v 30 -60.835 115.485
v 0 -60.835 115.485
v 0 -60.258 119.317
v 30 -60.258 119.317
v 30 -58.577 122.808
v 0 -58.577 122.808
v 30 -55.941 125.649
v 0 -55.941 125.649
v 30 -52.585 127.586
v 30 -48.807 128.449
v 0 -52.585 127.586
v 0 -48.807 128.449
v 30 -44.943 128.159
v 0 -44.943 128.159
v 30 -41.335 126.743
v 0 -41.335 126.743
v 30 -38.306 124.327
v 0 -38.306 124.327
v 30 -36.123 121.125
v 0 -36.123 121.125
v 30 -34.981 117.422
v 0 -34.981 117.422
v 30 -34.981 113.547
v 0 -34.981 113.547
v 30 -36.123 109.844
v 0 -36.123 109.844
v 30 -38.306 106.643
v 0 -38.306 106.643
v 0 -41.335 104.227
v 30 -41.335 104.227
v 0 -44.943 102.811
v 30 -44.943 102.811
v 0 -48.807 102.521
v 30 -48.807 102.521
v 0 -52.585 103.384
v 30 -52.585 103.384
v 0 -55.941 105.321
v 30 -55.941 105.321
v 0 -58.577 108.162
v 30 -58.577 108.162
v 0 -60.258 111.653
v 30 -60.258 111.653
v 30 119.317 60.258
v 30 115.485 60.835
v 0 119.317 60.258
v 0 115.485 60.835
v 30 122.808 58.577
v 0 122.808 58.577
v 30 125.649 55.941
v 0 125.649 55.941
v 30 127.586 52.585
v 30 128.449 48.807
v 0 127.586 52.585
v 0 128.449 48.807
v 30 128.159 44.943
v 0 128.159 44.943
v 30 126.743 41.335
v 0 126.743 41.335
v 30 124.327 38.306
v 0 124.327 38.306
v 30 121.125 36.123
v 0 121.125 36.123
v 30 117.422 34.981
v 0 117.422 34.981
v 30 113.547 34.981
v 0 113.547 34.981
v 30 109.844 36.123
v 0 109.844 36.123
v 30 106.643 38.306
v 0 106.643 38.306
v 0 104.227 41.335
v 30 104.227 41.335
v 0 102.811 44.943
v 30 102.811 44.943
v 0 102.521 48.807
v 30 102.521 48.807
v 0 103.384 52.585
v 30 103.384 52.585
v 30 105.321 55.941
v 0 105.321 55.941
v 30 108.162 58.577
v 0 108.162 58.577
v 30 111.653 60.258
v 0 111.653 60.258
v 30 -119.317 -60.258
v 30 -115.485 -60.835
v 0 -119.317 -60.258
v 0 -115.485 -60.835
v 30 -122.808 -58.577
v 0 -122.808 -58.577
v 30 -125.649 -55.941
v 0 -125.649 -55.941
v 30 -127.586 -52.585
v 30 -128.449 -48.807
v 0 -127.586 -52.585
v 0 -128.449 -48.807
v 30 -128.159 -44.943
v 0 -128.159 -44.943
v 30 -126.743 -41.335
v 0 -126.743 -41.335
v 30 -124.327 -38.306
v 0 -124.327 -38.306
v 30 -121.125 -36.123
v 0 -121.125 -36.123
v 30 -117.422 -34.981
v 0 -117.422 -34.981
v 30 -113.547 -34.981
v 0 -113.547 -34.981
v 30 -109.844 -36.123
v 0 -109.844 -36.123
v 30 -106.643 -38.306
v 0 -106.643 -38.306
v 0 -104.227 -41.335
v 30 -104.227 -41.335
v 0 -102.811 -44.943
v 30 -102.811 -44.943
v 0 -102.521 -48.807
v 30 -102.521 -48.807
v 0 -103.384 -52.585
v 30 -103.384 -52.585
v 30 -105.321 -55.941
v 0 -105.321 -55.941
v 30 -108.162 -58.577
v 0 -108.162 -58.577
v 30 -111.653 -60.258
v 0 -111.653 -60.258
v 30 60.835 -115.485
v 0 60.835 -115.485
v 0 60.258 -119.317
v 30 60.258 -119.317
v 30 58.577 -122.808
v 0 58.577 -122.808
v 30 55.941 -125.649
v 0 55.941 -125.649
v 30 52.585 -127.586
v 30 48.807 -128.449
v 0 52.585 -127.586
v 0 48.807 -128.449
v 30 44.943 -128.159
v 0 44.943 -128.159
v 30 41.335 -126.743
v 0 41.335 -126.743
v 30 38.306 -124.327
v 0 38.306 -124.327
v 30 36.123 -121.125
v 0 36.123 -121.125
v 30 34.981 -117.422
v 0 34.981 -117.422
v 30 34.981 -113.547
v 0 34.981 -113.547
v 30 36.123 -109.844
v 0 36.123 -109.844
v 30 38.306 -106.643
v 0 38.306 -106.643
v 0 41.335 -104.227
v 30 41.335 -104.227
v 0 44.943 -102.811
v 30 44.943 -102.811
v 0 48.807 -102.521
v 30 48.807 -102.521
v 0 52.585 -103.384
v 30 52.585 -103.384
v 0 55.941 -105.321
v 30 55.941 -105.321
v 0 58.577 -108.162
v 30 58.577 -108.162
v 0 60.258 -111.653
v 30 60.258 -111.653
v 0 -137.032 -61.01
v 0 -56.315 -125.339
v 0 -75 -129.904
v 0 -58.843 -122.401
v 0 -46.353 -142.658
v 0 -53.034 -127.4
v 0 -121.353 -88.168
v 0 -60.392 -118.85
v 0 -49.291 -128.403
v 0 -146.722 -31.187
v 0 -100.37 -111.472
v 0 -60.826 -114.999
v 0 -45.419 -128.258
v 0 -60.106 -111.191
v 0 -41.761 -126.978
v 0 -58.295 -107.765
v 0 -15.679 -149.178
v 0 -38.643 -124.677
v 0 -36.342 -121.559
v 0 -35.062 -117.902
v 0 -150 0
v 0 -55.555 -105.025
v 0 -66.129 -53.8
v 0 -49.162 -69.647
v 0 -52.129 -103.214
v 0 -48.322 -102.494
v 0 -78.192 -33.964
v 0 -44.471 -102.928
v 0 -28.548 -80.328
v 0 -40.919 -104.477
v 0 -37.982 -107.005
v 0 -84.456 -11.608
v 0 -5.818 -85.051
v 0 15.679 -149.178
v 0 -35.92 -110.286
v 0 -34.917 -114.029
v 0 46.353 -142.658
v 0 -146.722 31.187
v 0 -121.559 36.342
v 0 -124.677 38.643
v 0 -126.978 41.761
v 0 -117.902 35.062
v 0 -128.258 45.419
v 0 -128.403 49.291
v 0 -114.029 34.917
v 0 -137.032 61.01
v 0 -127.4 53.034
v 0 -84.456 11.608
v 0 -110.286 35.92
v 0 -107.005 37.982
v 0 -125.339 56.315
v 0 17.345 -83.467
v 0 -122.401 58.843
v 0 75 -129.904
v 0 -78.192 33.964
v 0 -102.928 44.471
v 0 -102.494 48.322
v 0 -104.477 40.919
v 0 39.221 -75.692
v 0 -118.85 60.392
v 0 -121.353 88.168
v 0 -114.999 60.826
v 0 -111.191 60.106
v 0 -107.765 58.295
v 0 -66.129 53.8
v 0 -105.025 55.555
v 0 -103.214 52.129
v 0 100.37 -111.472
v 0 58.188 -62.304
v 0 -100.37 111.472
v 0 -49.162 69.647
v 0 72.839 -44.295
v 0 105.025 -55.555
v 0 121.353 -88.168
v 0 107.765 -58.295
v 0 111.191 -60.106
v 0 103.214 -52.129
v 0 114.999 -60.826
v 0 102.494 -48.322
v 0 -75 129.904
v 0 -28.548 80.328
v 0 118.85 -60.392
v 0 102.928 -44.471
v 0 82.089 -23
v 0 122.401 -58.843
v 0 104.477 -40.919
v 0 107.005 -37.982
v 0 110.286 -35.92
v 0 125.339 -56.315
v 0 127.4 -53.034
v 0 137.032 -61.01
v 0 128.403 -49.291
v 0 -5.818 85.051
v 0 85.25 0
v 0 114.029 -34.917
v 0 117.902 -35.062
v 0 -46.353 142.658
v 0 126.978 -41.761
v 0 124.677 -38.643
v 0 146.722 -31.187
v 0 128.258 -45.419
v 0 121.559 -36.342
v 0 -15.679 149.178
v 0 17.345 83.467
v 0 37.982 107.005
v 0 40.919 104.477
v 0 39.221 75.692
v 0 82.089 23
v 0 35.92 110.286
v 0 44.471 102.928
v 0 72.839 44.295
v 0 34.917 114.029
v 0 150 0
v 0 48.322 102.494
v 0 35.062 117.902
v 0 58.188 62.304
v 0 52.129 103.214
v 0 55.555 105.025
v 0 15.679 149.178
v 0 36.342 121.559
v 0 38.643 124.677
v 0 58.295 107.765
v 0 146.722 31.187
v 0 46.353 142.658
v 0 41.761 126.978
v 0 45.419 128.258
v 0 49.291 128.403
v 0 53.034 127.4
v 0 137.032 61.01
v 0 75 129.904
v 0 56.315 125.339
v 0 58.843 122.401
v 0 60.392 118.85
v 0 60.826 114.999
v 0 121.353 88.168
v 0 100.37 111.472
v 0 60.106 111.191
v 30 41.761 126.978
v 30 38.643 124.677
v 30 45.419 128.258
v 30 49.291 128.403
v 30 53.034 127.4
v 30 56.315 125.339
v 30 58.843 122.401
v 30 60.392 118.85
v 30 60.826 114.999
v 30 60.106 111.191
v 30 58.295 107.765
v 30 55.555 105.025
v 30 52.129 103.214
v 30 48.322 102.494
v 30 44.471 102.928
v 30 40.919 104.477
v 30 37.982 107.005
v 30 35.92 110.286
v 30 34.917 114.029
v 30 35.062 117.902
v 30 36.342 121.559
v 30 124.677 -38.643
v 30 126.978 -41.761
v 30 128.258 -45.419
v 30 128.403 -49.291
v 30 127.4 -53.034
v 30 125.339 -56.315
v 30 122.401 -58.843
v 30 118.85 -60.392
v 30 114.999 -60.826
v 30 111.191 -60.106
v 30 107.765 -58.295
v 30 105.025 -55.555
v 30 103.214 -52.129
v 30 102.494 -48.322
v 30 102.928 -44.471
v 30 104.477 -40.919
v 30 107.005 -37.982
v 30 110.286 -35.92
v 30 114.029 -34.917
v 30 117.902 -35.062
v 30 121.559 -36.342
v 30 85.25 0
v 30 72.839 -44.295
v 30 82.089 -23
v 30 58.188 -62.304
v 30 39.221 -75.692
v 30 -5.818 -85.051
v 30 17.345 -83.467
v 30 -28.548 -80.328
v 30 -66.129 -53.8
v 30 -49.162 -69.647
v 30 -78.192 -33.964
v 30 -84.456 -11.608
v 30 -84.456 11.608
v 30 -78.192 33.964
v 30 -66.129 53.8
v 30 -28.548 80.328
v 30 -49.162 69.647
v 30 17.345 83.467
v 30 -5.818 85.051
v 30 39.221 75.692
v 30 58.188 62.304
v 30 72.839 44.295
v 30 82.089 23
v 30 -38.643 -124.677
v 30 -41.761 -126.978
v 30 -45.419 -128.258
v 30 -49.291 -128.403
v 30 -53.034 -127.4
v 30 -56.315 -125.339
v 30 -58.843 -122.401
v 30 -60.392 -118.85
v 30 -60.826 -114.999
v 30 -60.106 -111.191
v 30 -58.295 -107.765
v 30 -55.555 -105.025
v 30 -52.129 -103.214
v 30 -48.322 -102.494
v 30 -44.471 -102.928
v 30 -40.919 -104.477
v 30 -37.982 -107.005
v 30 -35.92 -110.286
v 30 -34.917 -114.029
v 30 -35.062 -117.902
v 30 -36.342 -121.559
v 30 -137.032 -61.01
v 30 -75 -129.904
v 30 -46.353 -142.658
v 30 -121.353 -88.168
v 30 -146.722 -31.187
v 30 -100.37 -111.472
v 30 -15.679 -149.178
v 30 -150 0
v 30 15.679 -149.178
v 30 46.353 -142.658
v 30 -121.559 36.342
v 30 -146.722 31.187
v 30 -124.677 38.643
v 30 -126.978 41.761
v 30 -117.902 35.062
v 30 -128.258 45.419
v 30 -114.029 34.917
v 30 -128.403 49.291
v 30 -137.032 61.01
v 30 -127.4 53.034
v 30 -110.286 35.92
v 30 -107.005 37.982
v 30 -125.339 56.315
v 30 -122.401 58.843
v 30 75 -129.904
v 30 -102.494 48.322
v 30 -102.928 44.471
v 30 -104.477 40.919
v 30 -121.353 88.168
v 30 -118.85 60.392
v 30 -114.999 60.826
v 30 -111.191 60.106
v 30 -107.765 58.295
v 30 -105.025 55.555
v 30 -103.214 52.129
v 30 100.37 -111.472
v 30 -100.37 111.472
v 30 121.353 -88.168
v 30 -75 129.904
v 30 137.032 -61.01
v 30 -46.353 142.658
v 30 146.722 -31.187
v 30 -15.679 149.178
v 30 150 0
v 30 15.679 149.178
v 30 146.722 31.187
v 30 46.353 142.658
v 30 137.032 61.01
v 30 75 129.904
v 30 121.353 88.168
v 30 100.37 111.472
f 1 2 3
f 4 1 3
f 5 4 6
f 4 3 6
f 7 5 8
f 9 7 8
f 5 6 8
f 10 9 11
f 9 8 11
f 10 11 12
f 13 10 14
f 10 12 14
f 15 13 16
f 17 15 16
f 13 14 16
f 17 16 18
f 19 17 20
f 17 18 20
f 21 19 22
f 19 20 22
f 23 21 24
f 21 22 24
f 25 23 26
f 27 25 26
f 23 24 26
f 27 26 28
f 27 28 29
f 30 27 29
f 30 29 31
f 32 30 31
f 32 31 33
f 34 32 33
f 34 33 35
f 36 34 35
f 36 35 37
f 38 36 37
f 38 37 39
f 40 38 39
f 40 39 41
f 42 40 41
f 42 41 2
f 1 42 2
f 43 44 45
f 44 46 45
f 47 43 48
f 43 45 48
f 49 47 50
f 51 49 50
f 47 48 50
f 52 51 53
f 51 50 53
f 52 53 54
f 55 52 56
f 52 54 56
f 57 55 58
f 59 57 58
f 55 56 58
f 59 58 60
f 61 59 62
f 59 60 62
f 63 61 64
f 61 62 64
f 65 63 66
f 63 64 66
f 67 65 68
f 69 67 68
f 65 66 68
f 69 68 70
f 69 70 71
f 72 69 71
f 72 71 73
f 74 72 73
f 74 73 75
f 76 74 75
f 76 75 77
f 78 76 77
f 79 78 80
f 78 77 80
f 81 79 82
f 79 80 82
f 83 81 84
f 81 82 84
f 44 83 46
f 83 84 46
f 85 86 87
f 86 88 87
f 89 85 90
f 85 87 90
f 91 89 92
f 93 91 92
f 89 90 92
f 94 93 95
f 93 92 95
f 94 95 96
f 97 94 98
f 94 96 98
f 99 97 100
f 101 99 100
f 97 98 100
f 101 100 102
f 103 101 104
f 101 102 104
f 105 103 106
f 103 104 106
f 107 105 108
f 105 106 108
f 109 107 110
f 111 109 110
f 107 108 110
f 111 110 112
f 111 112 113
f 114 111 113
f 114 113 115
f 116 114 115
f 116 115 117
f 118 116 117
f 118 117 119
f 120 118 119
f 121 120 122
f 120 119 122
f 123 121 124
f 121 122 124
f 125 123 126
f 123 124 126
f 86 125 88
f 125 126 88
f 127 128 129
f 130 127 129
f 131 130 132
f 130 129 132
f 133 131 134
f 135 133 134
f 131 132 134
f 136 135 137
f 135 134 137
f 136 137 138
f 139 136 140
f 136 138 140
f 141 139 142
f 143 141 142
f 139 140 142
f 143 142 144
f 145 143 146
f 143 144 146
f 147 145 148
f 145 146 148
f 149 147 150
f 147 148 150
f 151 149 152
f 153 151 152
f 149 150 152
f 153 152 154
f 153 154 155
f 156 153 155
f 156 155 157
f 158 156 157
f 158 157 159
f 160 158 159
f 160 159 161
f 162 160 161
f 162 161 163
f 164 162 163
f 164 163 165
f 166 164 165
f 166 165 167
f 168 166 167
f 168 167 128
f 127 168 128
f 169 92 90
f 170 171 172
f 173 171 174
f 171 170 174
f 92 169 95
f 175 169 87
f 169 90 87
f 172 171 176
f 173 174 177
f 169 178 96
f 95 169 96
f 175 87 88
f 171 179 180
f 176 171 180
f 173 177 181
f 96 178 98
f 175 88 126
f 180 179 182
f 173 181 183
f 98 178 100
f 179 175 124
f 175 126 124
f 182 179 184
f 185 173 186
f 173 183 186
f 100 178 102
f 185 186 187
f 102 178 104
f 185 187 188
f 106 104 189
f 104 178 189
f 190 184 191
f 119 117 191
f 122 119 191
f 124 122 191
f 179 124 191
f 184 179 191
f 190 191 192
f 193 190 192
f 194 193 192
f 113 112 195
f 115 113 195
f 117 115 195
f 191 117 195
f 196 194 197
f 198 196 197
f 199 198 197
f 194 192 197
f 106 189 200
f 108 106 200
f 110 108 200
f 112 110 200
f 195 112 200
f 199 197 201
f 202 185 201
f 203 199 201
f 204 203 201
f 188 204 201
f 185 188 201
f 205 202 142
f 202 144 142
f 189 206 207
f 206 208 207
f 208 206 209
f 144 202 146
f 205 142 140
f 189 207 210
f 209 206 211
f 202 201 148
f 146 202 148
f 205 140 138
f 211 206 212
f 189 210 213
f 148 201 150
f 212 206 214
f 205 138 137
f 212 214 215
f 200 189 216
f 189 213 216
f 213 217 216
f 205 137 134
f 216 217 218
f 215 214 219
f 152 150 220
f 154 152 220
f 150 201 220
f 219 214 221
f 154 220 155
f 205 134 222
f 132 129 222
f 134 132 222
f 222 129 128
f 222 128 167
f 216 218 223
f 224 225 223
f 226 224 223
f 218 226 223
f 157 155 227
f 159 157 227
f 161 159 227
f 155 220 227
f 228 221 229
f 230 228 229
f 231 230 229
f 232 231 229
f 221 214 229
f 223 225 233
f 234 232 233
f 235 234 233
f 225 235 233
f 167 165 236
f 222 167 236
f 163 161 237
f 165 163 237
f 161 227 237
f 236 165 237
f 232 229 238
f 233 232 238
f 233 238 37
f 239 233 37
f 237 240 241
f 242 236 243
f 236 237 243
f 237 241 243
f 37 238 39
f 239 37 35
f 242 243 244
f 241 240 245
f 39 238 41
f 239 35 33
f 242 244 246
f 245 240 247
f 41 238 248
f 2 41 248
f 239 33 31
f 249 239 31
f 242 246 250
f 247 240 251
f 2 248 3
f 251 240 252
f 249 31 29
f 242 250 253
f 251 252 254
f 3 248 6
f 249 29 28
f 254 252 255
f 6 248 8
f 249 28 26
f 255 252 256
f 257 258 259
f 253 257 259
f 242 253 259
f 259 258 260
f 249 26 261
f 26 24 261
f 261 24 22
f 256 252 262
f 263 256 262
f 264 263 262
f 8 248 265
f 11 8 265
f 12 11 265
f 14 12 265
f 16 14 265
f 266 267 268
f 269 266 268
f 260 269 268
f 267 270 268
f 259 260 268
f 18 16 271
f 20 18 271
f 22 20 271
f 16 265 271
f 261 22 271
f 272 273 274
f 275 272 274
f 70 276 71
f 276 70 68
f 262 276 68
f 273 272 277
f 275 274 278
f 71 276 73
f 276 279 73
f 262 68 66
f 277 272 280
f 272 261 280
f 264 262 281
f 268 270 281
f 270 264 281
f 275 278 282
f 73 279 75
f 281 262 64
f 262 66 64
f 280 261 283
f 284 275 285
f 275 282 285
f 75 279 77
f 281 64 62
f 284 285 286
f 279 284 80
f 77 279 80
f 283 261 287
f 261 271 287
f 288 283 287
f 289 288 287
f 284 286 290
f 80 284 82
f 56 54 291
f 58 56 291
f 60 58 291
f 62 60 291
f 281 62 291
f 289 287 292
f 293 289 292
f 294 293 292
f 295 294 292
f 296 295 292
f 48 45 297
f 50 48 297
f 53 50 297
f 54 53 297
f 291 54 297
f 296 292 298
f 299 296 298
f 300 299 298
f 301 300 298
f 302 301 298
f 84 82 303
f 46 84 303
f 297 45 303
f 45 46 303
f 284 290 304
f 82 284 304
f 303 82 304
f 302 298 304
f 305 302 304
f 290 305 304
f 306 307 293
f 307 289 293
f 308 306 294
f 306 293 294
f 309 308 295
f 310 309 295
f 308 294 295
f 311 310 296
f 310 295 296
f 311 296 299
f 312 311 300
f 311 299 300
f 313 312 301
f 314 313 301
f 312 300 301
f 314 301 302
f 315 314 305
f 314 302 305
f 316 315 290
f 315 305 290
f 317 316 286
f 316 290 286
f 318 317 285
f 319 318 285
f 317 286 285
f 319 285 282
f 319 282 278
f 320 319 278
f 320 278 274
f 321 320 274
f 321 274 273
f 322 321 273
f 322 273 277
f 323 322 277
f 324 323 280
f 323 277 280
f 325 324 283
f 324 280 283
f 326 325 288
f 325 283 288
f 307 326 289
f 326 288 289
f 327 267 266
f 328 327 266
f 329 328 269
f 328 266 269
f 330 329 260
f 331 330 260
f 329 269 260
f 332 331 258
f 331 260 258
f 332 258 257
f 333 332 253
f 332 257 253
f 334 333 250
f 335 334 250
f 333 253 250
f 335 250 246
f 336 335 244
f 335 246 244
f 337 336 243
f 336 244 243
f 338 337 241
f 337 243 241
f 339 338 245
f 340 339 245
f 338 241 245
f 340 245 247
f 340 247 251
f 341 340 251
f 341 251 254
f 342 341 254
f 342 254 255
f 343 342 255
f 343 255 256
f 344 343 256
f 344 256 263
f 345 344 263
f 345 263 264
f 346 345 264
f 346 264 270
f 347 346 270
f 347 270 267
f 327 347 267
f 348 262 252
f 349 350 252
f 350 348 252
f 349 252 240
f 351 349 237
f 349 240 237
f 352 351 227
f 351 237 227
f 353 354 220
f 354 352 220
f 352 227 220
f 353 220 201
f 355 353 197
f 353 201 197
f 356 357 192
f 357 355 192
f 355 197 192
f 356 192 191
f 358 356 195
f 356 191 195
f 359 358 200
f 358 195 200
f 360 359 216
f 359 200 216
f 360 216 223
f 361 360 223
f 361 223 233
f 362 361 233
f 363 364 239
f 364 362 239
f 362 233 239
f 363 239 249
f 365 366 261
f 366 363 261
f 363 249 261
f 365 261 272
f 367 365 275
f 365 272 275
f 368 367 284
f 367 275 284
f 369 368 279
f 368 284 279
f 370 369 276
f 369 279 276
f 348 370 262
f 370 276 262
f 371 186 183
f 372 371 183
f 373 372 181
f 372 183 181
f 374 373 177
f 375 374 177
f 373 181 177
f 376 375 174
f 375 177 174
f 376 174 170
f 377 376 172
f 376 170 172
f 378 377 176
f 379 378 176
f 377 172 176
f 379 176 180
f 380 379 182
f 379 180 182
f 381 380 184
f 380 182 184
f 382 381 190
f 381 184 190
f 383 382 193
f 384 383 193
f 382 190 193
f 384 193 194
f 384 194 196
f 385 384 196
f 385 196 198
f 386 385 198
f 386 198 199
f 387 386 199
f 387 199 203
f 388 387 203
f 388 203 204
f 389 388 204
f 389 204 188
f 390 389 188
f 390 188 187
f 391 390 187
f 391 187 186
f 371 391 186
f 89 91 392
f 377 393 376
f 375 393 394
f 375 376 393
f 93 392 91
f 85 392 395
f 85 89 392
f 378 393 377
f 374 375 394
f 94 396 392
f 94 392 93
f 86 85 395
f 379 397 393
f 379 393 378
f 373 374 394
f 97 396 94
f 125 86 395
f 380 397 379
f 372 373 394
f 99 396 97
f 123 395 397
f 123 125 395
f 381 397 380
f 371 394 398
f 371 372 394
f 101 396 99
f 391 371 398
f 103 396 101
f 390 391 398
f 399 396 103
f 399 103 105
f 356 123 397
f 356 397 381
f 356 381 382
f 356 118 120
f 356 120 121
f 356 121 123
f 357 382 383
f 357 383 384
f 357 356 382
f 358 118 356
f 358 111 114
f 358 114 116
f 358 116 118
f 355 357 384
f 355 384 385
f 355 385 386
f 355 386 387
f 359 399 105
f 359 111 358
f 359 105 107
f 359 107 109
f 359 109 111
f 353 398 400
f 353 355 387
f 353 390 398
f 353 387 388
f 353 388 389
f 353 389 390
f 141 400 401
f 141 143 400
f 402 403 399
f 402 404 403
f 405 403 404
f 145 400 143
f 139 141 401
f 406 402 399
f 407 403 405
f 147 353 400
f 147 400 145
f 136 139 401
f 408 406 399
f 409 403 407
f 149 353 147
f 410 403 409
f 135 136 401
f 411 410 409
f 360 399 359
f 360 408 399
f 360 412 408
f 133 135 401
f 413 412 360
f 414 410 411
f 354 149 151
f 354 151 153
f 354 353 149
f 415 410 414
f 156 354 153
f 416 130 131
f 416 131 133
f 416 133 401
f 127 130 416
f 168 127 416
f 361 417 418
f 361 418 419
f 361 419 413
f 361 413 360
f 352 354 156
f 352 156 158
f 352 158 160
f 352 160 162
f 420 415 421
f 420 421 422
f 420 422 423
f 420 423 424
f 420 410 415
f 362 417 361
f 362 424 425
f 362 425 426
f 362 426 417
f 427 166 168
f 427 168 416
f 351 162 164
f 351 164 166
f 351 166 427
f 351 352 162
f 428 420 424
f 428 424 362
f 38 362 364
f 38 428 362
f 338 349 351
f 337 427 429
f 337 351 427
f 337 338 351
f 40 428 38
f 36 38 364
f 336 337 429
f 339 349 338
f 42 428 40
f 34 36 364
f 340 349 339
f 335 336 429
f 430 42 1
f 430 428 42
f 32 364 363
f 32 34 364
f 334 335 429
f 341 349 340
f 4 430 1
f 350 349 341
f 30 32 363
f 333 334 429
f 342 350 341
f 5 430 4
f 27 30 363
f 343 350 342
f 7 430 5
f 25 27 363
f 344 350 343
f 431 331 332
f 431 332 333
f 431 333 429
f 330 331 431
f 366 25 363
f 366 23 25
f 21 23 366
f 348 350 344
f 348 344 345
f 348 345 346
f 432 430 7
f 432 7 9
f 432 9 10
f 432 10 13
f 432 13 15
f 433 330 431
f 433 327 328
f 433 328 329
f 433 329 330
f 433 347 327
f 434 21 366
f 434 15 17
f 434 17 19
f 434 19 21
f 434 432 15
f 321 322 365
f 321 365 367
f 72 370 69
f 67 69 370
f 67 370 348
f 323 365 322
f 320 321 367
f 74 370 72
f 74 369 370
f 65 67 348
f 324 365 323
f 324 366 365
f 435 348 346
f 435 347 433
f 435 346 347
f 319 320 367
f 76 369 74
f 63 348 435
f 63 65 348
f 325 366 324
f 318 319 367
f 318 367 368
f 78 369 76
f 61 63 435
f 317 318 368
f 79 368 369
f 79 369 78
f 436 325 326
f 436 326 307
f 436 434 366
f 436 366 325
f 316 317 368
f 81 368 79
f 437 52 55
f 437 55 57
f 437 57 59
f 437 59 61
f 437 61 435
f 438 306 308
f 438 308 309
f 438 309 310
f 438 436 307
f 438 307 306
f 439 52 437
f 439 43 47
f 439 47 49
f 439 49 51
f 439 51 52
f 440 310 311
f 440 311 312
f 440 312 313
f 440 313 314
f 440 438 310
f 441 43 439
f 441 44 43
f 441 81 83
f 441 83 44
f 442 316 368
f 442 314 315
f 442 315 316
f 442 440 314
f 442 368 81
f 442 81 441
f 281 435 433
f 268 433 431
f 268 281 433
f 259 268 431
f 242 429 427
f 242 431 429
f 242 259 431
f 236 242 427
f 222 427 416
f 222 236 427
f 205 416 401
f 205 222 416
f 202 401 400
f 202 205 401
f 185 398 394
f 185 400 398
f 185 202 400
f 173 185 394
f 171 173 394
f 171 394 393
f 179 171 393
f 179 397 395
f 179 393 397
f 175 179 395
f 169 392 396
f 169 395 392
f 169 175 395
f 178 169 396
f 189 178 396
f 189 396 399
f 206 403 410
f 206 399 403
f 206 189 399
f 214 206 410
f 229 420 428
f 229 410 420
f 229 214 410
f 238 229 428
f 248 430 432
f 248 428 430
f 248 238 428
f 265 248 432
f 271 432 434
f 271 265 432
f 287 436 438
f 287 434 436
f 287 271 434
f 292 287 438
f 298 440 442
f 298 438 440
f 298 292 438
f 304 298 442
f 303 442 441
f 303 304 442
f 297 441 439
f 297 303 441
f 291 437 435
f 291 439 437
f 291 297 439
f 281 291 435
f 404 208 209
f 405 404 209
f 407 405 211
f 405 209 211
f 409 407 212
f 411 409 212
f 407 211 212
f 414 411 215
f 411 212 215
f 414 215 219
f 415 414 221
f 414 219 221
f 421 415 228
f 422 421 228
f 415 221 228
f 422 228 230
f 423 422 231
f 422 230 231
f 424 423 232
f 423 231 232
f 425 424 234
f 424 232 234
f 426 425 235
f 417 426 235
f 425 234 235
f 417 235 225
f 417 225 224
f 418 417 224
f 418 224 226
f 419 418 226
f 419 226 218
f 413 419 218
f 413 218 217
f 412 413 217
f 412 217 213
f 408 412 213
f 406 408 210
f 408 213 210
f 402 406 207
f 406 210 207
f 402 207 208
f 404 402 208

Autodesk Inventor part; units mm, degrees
ref_plane "YZ Plane" through (0, 0, 0) normal (1, 0, 0) x (0, 1, 0)
ref_plane "XZ Plane" through (0, 0, 0) normal (0, 1, 0) x (-1, 0, 0)
ref_plane "XY Plane" through (0, 0, 0) normal (0, 0, 1) x (1, 0, 0)
sketch "Sketch1" plane through (0, 0, 0) normal (0, 0, 1) x (1, 0, 0)
  line L0 (30, 150) -> (0, 150)
  line L1 (0, 150) -> (0, 85.25)
  line L2 (0, 85.25) -> (0, 0) construction
  line L3 (0, 0) -> (30, 0) construction
  line L4 (30, 150) -> (30, 85.25)
  line L5 (30, 85.25) -> (0, 85.25)
  line L6 (30, 85.25) -> (30, 0) construction
  dimension "d0" = 300
  dimension "d1" = 30
  dimension "d5" = 170.5
revolve "Revolution1" add sketch "Sketch1" angle 360 about axis through (0, 0, 0) along (1, 0, 0)
sketch "Sketch2" plane through (0, 0, 0) normal (-1, 0, 0) x (0, 0, 1)
  circle A0 centre (0, 0) radius 85.25 projected
  line L0 (0, 125) -> (0, 0) construction
  circle A1 centre (0, 0) radius 150 projected
  circle A2 centre (0, 0) radius 125 construction
  line L1 (0, 0) -> (47.8354, 115.4849) construction
  circle A3 centre (47.8354, 115.4849) radius 13
  dimension "d6" = 26
  dimension "d7" = 125
  dimension "d8" = 22.5
extrude "Extrusion1" cut sketch "Sketch2" against normal through all contours A3
pattern_circular "Circular Pattern1" count 8 over 360 about axis through (15, 0, 0) along (1, 0, 0) of "Extrusion1"
equation "\"d6\" = dd2"
equation "\"d7\" = 0.5 * k"
equation "\"d0\" = D"
equation "\"d1\" = b"
equation "\"d5\" = dd5"
equation "\"b\" = 30"
equation "\"D\" = 300"
equation "\"dd2\" = 26"
equation "\"dd5\" = 170.5"
equation "\"Size_Designation\" = 1.2345"
equation "\"k\" = 250"
properties part number "DIN EN 1092-1 Plate Flange for Welding Type 01 - PN 25 150 x 168.3" material "Steel"
